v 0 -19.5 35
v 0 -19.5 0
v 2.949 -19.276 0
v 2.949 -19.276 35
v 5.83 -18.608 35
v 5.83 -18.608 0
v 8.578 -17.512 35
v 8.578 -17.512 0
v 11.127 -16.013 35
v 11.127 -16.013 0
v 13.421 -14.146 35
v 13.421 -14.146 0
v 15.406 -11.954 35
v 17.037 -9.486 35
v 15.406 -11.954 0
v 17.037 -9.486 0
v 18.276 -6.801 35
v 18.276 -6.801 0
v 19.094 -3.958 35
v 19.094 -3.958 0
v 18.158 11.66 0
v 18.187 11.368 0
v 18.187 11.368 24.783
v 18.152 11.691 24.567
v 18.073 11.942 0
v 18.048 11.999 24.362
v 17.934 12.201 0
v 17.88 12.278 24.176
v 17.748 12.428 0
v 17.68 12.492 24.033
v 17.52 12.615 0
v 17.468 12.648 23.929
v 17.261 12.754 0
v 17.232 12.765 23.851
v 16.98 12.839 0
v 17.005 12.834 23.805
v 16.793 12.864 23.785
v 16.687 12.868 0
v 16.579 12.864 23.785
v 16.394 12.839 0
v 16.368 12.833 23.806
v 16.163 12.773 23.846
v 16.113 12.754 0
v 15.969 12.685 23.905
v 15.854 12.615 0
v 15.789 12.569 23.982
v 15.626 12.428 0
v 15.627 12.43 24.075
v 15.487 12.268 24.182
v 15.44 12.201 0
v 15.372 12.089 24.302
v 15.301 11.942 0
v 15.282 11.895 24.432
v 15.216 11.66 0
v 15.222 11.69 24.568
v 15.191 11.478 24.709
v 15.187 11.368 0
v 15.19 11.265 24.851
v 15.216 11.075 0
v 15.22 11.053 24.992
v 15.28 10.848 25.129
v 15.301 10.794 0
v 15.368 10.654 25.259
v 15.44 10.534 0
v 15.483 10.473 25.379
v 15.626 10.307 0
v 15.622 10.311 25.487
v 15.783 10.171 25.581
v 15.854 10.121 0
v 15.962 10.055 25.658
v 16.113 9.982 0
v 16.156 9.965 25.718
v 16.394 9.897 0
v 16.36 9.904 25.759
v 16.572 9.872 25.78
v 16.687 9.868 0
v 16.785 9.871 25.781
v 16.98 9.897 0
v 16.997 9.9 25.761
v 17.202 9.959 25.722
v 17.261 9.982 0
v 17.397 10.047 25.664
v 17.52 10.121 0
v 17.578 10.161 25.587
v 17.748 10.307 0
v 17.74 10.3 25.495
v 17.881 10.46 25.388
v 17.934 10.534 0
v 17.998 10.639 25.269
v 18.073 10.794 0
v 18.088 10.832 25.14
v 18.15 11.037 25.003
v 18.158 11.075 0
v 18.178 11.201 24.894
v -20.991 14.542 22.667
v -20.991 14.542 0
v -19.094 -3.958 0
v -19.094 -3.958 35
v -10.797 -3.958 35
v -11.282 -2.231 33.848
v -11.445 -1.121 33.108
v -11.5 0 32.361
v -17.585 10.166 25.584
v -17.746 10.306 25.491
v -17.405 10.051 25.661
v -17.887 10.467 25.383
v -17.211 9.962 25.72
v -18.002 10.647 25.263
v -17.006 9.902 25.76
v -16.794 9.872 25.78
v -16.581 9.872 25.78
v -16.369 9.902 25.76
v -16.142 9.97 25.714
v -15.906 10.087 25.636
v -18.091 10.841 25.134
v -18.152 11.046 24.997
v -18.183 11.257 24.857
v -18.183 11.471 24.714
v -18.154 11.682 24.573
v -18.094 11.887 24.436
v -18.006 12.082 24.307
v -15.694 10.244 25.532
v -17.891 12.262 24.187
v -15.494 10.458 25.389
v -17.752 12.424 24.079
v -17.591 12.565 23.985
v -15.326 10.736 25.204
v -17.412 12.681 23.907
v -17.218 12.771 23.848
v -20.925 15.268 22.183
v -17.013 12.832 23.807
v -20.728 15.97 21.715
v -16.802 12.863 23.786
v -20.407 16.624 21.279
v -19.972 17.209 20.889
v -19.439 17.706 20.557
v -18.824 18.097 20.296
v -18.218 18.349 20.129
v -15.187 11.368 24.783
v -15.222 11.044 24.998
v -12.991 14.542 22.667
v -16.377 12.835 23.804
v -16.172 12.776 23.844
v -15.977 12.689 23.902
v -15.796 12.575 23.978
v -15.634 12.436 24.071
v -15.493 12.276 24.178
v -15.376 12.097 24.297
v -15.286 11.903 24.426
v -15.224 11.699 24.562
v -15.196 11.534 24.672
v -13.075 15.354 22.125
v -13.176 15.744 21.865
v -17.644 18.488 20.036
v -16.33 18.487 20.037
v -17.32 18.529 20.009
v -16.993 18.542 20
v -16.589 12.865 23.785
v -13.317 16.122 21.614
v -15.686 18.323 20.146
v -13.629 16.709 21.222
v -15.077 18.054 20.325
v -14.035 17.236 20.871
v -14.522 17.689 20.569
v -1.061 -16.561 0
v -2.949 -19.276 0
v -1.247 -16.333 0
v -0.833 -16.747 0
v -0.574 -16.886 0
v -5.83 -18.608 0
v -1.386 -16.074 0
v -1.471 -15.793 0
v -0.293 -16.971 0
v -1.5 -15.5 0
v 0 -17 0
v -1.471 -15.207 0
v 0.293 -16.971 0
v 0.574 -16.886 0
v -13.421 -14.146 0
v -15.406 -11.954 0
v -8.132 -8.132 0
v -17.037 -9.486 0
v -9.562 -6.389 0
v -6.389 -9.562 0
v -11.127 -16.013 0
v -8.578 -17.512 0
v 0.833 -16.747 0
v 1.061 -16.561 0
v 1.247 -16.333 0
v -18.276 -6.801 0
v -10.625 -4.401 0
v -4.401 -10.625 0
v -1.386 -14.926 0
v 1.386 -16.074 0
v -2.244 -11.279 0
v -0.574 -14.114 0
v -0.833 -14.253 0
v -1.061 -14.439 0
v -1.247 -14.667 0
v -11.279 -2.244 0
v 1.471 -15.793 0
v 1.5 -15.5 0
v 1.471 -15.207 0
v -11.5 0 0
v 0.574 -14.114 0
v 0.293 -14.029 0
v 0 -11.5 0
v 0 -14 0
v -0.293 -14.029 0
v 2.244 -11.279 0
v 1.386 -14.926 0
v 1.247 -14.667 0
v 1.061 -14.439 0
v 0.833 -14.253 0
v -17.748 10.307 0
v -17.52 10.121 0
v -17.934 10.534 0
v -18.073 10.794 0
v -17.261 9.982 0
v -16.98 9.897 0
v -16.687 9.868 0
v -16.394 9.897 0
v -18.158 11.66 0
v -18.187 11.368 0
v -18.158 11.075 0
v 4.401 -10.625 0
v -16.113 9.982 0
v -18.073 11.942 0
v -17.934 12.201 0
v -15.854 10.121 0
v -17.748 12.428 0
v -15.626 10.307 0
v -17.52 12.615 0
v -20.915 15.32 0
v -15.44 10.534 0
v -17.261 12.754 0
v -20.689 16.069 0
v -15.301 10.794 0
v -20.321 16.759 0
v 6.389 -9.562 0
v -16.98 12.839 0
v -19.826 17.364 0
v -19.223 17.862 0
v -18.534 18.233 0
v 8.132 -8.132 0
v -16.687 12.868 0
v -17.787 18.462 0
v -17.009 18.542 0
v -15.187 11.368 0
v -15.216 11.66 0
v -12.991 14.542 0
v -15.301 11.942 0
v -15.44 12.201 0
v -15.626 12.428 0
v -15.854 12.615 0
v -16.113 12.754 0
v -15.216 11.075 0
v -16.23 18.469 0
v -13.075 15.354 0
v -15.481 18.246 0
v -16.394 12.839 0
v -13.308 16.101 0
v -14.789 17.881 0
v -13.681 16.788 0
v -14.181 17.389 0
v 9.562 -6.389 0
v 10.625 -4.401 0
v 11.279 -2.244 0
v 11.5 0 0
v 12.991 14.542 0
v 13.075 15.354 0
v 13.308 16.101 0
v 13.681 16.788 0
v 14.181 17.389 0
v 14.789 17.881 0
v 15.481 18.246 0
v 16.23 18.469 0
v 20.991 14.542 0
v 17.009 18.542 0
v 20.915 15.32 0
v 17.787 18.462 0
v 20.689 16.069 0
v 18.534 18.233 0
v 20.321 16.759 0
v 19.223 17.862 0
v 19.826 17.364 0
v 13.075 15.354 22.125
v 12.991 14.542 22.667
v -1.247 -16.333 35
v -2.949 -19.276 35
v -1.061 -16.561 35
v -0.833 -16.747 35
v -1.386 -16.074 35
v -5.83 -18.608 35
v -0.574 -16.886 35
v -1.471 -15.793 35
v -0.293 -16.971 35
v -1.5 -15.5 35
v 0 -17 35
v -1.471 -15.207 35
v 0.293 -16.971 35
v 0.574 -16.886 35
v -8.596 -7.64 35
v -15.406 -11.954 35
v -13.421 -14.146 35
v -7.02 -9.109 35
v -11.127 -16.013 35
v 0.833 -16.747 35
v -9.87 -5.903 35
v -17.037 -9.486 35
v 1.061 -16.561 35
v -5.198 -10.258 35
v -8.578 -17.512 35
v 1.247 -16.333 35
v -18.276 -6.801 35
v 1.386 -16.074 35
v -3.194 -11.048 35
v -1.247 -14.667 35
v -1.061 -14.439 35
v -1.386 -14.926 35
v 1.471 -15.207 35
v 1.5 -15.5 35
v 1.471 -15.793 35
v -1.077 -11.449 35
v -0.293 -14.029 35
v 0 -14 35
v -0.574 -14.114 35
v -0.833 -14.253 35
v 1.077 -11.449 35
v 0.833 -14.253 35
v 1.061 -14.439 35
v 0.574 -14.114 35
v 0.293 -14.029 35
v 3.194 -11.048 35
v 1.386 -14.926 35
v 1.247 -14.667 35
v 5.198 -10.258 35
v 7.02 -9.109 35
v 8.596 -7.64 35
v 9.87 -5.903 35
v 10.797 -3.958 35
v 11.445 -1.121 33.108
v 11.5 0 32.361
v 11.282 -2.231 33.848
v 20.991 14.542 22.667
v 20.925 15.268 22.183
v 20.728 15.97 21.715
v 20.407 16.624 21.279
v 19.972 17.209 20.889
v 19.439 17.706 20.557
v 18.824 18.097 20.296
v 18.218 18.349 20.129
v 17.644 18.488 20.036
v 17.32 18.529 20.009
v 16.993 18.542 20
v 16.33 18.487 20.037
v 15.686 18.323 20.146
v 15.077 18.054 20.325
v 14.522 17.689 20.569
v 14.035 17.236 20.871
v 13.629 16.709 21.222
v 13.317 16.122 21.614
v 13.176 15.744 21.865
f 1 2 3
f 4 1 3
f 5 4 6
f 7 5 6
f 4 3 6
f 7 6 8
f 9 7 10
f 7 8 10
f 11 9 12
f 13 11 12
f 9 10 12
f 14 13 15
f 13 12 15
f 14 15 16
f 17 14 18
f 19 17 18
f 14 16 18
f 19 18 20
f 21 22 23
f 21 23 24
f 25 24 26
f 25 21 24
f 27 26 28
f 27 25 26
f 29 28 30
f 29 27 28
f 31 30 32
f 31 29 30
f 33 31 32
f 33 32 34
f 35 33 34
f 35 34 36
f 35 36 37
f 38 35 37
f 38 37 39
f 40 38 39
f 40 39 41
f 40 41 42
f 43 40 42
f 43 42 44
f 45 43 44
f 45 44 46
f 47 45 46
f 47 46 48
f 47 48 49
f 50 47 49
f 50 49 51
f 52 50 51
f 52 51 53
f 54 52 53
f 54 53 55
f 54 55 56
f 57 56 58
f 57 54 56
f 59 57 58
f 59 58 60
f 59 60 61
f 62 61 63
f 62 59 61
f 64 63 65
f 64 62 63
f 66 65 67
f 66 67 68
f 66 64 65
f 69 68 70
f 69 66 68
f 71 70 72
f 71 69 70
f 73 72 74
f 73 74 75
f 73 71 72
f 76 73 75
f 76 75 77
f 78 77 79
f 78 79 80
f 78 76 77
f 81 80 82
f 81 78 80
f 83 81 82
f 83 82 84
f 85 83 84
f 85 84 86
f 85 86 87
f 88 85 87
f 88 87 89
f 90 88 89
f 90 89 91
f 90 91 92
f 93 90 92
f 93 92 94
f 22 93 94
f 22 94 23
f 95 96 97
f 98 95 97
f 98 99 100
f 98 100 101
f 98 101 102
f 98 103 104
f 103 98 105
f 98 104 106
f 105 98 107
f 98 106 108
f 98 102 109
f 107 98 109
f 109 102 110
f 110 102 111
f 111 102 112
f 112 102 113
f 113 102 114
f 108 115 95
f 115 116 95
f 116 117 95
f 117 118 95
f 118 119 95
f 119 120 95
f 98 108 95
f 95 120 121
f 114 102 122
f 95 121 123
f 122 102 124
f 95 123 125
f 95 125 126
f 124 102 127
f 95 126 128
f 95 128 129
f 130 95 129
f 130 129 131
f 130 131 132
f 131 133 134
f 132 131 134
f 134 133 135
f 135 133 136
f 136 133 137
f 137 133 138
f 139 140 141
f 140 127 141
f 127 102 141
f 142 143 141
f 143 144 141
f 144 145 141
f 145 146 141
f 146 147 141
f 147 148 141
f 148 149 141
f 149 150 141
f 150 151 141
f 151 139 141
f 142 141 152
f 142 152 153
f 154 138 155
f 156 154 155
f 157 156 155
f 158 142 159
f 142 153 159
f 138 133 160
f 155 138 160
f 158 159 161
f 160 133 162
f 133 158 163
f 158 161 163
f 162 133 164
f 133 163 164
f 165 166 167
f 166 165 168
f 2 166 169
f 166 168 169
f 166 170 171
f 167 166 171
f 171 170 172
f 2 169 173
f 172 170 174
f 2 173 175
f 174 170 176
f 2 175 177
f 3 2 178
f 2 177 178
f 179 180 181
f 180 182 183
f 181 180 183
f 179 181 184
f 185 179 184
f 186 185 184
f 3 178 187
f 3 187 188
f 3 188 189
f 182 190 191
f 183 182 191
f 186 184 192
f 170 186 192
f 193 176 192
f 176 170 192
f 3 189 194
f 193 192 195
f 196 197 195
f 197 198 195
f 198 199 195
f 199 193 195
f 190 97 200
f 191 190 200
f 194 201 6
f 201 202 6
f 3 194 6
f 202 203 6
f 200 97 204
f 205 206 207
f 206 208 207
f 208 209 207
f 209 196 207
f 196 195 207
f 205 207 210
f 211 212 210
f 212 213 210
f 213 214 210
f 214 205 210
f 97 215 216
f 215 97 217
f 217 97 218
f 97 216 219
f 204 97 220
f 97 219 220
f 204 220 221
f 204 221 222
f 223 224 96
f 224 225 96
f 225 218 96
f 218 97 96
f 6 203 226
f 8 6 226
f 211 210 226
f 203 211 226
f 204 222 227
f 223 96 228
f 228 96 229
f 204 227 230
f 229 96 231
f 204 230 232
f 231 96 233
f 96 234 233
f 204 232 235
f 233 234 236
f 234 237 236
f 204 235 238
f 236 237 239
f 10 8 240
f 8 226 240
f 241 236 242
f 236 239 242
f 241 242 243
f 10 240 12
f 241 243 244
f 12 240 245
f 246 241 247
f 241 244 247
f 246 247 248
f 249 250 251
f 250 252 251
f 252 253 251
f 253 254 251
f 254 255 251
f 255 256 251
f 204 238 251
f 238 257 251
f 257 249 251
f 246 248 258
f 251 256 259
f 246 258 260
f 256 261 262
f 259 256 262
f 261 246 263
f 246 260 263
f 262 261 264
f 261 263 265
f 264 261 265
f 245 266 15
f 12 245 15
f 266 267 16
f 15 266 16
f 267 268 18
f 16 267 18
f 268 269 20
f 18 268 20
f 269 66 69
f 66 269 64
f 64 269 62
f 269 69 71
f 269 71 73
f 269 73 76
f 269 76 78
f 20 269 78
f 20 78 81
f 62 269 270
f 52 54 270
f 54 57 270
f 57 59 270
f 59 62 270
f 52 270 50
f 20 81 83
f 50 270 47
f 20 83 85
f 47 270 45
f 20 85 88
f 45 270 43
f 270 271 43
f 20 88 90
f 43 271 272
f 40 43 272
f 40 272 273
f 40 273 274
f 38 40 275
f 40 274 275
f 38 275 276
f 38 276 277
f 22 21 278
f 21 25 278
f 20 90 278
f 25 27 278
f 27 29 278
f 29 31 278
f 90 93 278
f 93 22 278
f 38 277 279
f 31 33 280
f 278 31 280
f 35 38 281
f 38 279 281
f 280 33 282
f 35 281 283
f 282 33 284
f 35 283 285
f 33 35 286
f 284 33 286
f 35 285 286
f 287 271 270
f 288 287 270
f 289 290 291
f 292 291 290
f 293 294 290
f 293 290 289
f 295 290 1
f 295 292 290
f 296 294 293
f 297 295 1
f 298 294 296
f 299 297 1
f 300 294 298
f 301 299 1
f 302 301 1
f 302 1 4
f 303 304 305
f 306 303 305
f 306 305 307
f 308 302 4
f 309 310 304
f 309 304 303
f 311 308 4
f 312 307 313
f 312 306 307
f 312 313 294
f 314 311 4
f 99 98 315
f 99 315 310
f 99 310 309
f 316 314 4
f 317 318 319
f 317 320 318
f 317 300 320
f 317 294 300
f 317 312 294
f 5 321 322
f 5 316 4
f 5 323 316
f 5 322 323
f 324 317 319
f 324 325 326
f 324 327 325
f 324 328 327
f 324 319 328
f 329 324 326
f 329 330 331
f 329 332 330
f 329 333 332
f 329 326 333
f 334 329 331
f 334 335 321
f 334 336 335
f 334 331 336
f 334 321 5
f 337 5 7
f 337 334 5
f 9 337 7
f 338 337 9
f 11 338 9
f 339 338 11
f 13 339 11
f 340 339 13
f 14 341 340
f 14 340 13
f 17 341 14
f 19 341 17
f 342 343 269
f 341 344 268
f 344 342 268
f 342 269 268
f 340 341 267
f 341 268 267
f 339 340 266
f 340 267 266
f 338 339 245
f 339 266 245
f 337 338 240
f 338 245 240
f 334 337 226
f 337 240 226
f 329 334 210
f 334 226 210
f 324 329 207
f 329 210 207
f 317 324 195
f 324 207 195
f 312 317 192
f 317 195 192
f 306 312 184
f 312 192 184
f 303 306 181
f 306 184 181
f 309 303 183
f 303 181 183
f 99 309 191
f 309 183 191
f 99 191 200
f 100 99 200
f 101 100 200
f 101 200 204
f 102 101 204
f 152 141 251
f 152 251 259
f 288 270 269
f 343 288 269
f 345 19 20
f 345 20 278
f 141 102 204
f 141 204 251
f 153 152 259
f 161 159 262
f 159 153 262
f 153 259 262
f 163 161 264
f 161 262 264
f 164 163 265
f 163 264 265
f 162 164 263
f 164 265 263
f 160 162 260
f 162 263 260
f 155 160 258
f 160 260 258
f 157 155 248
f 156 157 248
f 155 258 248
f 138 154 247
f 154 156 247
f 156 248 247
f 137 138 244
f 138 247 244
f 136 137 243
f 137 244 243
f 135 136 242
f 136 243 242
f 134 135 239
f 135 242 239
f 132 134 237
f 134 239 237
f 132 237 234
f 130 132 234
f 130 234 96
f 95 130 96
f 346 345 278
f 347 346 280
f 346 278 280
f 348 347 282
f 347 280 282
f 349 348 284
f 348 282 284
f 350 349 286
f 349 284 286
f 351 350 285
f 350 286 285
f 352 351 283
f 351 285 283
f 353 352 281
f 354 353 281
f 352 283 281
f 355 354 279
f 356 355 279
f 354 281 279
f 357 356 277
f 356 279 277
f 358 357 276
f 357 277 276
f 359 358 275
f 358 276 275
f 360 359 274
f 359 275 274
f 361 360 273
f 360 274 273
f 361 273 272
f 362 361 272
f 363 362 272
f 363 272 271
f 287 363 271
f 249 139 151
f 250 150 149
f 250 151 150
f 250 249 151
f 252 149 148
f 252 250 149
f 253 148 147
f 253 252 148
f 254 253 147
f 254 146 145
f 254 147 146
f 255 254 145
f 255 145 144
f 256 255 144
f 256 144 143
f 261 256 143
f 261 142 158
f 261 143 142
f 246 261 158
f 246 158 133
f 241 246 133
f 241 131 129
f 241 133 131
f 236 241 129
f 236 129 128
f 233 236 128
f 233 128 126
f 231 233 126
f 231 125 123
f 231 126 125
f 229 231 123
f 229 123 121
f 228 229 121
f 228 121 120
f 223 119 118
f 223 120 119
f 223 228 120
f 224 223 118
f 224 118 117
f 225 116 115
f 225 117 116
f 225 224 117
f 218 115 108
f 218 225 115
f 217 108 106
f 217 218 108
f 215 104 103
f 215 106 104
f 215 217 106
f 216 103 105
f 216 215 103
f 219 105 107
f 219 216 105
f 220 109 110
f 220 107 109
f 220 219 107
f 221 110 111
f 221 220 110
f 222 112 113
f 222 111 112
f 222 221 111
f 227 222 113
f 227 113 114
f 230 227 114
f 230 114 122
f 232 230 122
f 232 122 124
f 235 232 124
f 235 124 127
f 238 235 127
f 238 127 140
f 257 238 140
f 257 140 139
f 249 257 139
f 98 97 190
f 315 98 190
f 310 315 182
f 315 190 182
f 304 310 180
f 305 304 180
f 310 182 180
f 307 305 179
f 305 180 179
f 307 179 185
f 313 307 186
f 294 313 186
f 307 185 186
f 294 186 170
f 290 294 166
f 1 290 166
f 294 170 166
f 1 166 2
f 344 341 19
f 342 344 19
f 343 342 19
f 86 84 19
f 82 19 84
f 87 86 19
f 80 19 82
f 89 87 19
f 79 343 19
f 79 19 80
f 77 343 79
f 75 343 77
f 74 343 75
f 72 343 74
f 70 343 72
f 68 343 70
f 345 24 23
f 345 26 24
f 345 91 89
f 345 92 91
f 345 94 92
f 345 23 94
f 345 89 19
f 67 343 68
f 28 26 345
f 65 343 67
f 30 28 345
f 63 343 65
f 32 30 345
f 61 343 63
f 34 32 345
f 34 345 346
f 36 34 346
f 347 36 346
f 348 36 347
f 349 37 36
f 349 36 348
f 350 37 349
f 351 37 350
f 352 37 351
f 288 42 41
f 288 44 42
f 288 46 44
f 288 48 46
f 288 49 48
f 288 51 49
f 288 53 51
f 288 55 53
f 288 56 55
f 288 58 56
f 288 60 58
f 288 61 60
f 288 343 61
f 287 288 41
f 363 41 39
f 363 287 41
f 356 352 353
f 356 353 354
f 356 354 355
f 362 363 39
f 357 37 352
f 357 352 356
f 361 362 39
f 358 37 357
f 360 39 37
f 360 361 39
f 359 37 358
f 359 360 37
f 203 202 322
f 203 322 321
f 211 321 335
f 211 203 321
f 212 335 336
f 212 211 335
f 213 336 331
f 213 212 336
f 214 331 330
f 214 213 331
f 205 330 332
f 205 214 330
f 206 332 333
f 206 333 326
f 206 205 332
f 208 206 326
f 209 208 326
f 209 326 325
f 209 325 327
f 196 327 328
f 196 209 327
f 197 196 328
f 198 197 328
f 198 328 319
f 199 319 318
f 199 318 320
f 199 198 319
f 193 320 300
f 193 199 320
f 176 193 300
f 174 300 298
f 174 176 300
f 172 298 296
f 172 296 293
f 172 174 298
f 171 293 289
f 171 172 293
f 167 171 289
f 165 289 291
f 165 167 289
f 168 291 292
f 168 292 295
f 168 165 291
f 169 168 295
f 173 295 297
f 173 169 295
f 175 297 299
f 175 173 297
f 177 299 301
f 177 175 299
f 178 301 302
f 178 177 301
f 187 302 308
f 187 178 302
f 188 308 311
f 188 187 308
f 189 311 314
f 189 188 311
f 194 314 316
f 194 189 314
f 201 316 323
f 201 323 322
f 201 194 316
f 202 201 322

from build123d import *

# Parameters (mm, degrees)
F0_R          = 1.5
F1_DEPTH      = 35
F3_DEPTH      = 20.992492
F3_DEPTH_BACK = 20.992492


with BuildPart() as f1:
    # F0 (on Top) → F1 (new body)
    with BuildSketch(Plane.XY):
        with BuildLine():
            Line((12.991492, 14.542047), (11.5, 0))
            ThreePointArc((11.5, 0), (0, -11.5), (-11.5, 0))
            Line((-11.5, 0), (-12.991492, 14.542047))
            Line((-12.991492, 14.542047), (-13.074771, 15.354019))
            ThreePointArc((-13.074771, 15.354019), (-17.399607, 18.521173), (-20.991492, 14.542047))
            Line((-20.991492, 14.542047), (-19.094014, -3.95836))
            ThreePointArc((-19.094014, -3.95836), (-12.309792, -15.123459), (0, -19.5))
            ThreePointArc((0, -19.5), (12.309792, -15.123459), (19.094014, -3.95836))
            Line((19.094014, -3.95836), (20.991492, 14.542047))
            ThreePointArc((20.991492, 14.542047), (17.399607, 18.521173), (13.074771, 15.354019))
            Line((13.074771, 15.354019), (12.991492, 14.542047))
        make_face()
        with Locations((0, -15.5)):
            Circle(F0_R, mode=Mode.SUBTRACT)
        with Locations((-16.686909, 11.367775)):
            Circle(F0_R, mode=Mode.SUBTRACT)
        with Locations((16.686909, 11.367775)):
            Circle(F0_R, mode=Mode.SUBTRACT)
    extrude(amount=F1_DEPTH)

    # F2 (on Right) → F3 (cut, two sides)
    with BuildSketch(Plane.YZ) as f3_sk:
        Polygon((18.542047, 35), (14.542047, 35), (-3.95836, 35), (18.542047, 20), align=None)
    extrude(amount=F3_DEPTH, mode=Mode.SUBTRACT)
    extrude(f3_sk.sketch, amount=-F3_DEPTH_BACK, mode=Mode.SUBTRACT)


solid = f1.part
